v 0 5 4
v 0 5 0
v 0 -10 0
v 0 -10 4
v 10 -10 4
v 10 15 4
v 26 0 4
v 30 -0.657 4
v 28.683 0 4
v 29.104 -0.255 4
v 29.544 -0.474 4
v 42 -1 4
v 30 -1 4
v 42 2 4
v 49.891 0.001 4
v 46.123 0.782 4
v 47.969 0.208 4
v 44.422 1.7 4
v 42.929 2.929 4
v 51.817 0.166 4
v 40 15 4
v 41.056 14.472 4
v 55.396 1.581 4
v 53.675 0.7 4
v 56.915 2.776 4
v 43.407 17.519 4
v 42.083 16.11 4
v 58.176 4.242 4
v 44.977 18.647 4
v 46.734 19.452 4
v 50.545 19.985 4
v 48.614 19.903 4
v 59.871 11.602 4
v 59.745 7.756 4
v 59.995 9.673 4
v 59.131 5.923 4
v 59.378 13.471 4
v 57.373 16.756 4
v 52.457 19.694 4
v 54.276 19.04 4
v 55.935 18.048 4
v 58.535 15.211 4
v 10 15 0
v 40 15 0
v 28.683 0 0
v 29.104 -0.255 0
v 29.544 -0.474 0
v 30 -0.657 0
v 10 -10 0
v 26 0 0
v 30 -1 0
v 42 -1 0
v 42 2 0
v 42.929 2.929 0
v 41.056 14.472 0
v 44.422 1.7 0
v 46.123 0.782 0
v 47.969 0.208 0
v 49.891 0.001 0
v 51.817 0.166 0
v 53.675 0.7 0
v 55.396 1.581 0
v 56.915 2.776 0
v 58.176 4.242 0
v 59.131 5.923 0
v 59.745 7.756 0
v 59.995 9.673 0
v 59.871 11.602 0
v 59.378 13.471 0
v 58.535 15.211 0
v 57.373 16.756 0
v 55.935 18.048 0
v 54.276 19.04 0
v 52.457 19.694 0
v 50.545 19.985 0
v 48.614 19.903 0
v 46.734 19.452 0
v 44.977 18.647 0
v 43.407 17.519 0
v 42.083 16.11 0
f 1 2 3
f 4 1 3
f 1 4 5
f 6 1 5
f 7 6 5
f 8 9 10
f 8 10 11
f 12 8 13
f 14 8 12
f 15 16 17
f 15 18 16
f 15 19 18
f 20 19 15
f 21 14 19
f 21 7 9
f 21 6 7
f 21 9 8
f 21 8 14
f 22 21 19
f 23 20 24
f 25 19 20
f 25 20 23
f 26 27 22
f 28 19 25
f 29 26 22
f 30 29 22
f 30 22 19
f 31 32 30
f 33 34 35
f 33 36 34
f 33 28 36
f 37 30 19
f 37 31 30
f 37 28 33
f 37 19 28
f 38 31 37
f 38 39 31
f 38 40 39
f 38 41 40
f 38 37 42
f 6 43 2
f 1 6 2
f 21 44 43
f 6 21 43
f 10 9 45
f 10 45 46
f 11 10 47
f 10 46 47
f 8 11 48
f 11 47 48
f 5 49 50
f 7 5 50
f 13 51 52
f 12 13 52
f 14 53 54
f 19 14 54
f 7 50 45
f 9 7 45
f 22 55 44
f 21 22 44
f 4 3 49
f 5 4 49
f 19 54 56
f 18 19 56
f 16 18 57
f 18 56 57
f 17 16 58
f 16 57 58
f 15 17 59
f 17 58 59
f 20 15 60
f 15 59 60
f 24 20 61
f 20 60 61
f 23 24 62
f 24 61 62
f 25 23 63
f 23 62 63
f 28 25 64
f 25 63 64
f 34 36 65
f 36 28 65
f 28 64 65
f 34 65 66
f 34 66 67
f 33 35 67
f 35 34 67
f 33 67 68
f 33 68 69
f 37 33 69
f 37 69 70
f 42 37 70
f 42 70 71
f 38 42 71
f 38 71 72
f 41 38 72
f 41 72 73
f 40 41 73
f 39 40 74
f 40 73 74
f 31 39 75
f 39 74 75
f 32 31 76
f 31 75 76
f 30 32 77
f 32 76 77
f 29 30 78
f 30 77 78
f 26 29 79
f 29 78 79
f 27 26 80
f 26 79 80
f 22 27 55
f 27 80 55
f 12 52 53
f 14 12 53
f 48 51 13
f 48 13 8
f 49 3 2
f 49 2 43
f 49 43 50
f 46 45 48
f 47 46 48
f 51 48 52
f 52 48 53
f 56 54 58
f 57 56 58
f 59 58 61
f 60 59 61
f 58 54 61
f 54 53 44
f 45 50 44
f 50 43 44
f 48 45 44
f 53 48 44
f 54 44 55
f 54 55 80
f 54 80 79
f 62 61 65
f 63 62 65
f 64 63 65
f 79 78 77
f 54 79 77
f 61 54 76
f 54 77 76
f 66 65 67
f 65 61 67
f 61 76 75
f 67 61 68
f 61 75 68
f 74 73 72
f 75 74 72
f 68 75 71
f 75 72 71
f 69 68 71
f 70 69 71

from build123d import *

# Parameters (mm, degrees)
BOSS_EXTRUDE1_DEPTH = 4
SKETCH2_R           = 10
BOSS_EXTRUDE2_DEPTH = 4
SKETCH6_R           = 6
BOSS_EXTRUDE3_DEPTH = 4
SKETCH9_W           = 12
SKETCH9_H           = 12
BOSS_EXTRUDE4_DEPTH = 4


with BuildPart() as part:
    # Sketch1 → Boss-Extrude1 (new body)
    with BuildSketch(Plane.XY):
        Polygon((0, -10), (10, -10), (26, 0), (40, 0), (50, 10), (40, 15), (10, 15), (0, 5), align=None)
    extrude(amount=BOSS_EXTRUDE1_DEPTH)

    # Sketch2 → Boss-Extrude2 (add)
    with BuildSketch(Plane.XY):
        with Locations((50, 10)):
            Circle(SKETCH2_R)
    extrude(amount=BOSS_EXTRUDE2_DEPTH)

    # Sketch6 → Boss-Extrude3 (add)
    with BuildSketch(Plane.XY):
        with Locations((32, 5)):
            Circle(SKETCH6_R)
    extrude(amount=BOSS_EXTRUDE3_DEPTH)

    # Sketch9 → Boss-Extrude4 (add)
    with BuildSketch(Plane.XY):
        with Locations((36, 5)):
            Rectangle(SKETCH9_W, SKETCH9_H)
    extrude(amount=BOSS_EXTRUDE4_DEPTH)


solid = part.part
